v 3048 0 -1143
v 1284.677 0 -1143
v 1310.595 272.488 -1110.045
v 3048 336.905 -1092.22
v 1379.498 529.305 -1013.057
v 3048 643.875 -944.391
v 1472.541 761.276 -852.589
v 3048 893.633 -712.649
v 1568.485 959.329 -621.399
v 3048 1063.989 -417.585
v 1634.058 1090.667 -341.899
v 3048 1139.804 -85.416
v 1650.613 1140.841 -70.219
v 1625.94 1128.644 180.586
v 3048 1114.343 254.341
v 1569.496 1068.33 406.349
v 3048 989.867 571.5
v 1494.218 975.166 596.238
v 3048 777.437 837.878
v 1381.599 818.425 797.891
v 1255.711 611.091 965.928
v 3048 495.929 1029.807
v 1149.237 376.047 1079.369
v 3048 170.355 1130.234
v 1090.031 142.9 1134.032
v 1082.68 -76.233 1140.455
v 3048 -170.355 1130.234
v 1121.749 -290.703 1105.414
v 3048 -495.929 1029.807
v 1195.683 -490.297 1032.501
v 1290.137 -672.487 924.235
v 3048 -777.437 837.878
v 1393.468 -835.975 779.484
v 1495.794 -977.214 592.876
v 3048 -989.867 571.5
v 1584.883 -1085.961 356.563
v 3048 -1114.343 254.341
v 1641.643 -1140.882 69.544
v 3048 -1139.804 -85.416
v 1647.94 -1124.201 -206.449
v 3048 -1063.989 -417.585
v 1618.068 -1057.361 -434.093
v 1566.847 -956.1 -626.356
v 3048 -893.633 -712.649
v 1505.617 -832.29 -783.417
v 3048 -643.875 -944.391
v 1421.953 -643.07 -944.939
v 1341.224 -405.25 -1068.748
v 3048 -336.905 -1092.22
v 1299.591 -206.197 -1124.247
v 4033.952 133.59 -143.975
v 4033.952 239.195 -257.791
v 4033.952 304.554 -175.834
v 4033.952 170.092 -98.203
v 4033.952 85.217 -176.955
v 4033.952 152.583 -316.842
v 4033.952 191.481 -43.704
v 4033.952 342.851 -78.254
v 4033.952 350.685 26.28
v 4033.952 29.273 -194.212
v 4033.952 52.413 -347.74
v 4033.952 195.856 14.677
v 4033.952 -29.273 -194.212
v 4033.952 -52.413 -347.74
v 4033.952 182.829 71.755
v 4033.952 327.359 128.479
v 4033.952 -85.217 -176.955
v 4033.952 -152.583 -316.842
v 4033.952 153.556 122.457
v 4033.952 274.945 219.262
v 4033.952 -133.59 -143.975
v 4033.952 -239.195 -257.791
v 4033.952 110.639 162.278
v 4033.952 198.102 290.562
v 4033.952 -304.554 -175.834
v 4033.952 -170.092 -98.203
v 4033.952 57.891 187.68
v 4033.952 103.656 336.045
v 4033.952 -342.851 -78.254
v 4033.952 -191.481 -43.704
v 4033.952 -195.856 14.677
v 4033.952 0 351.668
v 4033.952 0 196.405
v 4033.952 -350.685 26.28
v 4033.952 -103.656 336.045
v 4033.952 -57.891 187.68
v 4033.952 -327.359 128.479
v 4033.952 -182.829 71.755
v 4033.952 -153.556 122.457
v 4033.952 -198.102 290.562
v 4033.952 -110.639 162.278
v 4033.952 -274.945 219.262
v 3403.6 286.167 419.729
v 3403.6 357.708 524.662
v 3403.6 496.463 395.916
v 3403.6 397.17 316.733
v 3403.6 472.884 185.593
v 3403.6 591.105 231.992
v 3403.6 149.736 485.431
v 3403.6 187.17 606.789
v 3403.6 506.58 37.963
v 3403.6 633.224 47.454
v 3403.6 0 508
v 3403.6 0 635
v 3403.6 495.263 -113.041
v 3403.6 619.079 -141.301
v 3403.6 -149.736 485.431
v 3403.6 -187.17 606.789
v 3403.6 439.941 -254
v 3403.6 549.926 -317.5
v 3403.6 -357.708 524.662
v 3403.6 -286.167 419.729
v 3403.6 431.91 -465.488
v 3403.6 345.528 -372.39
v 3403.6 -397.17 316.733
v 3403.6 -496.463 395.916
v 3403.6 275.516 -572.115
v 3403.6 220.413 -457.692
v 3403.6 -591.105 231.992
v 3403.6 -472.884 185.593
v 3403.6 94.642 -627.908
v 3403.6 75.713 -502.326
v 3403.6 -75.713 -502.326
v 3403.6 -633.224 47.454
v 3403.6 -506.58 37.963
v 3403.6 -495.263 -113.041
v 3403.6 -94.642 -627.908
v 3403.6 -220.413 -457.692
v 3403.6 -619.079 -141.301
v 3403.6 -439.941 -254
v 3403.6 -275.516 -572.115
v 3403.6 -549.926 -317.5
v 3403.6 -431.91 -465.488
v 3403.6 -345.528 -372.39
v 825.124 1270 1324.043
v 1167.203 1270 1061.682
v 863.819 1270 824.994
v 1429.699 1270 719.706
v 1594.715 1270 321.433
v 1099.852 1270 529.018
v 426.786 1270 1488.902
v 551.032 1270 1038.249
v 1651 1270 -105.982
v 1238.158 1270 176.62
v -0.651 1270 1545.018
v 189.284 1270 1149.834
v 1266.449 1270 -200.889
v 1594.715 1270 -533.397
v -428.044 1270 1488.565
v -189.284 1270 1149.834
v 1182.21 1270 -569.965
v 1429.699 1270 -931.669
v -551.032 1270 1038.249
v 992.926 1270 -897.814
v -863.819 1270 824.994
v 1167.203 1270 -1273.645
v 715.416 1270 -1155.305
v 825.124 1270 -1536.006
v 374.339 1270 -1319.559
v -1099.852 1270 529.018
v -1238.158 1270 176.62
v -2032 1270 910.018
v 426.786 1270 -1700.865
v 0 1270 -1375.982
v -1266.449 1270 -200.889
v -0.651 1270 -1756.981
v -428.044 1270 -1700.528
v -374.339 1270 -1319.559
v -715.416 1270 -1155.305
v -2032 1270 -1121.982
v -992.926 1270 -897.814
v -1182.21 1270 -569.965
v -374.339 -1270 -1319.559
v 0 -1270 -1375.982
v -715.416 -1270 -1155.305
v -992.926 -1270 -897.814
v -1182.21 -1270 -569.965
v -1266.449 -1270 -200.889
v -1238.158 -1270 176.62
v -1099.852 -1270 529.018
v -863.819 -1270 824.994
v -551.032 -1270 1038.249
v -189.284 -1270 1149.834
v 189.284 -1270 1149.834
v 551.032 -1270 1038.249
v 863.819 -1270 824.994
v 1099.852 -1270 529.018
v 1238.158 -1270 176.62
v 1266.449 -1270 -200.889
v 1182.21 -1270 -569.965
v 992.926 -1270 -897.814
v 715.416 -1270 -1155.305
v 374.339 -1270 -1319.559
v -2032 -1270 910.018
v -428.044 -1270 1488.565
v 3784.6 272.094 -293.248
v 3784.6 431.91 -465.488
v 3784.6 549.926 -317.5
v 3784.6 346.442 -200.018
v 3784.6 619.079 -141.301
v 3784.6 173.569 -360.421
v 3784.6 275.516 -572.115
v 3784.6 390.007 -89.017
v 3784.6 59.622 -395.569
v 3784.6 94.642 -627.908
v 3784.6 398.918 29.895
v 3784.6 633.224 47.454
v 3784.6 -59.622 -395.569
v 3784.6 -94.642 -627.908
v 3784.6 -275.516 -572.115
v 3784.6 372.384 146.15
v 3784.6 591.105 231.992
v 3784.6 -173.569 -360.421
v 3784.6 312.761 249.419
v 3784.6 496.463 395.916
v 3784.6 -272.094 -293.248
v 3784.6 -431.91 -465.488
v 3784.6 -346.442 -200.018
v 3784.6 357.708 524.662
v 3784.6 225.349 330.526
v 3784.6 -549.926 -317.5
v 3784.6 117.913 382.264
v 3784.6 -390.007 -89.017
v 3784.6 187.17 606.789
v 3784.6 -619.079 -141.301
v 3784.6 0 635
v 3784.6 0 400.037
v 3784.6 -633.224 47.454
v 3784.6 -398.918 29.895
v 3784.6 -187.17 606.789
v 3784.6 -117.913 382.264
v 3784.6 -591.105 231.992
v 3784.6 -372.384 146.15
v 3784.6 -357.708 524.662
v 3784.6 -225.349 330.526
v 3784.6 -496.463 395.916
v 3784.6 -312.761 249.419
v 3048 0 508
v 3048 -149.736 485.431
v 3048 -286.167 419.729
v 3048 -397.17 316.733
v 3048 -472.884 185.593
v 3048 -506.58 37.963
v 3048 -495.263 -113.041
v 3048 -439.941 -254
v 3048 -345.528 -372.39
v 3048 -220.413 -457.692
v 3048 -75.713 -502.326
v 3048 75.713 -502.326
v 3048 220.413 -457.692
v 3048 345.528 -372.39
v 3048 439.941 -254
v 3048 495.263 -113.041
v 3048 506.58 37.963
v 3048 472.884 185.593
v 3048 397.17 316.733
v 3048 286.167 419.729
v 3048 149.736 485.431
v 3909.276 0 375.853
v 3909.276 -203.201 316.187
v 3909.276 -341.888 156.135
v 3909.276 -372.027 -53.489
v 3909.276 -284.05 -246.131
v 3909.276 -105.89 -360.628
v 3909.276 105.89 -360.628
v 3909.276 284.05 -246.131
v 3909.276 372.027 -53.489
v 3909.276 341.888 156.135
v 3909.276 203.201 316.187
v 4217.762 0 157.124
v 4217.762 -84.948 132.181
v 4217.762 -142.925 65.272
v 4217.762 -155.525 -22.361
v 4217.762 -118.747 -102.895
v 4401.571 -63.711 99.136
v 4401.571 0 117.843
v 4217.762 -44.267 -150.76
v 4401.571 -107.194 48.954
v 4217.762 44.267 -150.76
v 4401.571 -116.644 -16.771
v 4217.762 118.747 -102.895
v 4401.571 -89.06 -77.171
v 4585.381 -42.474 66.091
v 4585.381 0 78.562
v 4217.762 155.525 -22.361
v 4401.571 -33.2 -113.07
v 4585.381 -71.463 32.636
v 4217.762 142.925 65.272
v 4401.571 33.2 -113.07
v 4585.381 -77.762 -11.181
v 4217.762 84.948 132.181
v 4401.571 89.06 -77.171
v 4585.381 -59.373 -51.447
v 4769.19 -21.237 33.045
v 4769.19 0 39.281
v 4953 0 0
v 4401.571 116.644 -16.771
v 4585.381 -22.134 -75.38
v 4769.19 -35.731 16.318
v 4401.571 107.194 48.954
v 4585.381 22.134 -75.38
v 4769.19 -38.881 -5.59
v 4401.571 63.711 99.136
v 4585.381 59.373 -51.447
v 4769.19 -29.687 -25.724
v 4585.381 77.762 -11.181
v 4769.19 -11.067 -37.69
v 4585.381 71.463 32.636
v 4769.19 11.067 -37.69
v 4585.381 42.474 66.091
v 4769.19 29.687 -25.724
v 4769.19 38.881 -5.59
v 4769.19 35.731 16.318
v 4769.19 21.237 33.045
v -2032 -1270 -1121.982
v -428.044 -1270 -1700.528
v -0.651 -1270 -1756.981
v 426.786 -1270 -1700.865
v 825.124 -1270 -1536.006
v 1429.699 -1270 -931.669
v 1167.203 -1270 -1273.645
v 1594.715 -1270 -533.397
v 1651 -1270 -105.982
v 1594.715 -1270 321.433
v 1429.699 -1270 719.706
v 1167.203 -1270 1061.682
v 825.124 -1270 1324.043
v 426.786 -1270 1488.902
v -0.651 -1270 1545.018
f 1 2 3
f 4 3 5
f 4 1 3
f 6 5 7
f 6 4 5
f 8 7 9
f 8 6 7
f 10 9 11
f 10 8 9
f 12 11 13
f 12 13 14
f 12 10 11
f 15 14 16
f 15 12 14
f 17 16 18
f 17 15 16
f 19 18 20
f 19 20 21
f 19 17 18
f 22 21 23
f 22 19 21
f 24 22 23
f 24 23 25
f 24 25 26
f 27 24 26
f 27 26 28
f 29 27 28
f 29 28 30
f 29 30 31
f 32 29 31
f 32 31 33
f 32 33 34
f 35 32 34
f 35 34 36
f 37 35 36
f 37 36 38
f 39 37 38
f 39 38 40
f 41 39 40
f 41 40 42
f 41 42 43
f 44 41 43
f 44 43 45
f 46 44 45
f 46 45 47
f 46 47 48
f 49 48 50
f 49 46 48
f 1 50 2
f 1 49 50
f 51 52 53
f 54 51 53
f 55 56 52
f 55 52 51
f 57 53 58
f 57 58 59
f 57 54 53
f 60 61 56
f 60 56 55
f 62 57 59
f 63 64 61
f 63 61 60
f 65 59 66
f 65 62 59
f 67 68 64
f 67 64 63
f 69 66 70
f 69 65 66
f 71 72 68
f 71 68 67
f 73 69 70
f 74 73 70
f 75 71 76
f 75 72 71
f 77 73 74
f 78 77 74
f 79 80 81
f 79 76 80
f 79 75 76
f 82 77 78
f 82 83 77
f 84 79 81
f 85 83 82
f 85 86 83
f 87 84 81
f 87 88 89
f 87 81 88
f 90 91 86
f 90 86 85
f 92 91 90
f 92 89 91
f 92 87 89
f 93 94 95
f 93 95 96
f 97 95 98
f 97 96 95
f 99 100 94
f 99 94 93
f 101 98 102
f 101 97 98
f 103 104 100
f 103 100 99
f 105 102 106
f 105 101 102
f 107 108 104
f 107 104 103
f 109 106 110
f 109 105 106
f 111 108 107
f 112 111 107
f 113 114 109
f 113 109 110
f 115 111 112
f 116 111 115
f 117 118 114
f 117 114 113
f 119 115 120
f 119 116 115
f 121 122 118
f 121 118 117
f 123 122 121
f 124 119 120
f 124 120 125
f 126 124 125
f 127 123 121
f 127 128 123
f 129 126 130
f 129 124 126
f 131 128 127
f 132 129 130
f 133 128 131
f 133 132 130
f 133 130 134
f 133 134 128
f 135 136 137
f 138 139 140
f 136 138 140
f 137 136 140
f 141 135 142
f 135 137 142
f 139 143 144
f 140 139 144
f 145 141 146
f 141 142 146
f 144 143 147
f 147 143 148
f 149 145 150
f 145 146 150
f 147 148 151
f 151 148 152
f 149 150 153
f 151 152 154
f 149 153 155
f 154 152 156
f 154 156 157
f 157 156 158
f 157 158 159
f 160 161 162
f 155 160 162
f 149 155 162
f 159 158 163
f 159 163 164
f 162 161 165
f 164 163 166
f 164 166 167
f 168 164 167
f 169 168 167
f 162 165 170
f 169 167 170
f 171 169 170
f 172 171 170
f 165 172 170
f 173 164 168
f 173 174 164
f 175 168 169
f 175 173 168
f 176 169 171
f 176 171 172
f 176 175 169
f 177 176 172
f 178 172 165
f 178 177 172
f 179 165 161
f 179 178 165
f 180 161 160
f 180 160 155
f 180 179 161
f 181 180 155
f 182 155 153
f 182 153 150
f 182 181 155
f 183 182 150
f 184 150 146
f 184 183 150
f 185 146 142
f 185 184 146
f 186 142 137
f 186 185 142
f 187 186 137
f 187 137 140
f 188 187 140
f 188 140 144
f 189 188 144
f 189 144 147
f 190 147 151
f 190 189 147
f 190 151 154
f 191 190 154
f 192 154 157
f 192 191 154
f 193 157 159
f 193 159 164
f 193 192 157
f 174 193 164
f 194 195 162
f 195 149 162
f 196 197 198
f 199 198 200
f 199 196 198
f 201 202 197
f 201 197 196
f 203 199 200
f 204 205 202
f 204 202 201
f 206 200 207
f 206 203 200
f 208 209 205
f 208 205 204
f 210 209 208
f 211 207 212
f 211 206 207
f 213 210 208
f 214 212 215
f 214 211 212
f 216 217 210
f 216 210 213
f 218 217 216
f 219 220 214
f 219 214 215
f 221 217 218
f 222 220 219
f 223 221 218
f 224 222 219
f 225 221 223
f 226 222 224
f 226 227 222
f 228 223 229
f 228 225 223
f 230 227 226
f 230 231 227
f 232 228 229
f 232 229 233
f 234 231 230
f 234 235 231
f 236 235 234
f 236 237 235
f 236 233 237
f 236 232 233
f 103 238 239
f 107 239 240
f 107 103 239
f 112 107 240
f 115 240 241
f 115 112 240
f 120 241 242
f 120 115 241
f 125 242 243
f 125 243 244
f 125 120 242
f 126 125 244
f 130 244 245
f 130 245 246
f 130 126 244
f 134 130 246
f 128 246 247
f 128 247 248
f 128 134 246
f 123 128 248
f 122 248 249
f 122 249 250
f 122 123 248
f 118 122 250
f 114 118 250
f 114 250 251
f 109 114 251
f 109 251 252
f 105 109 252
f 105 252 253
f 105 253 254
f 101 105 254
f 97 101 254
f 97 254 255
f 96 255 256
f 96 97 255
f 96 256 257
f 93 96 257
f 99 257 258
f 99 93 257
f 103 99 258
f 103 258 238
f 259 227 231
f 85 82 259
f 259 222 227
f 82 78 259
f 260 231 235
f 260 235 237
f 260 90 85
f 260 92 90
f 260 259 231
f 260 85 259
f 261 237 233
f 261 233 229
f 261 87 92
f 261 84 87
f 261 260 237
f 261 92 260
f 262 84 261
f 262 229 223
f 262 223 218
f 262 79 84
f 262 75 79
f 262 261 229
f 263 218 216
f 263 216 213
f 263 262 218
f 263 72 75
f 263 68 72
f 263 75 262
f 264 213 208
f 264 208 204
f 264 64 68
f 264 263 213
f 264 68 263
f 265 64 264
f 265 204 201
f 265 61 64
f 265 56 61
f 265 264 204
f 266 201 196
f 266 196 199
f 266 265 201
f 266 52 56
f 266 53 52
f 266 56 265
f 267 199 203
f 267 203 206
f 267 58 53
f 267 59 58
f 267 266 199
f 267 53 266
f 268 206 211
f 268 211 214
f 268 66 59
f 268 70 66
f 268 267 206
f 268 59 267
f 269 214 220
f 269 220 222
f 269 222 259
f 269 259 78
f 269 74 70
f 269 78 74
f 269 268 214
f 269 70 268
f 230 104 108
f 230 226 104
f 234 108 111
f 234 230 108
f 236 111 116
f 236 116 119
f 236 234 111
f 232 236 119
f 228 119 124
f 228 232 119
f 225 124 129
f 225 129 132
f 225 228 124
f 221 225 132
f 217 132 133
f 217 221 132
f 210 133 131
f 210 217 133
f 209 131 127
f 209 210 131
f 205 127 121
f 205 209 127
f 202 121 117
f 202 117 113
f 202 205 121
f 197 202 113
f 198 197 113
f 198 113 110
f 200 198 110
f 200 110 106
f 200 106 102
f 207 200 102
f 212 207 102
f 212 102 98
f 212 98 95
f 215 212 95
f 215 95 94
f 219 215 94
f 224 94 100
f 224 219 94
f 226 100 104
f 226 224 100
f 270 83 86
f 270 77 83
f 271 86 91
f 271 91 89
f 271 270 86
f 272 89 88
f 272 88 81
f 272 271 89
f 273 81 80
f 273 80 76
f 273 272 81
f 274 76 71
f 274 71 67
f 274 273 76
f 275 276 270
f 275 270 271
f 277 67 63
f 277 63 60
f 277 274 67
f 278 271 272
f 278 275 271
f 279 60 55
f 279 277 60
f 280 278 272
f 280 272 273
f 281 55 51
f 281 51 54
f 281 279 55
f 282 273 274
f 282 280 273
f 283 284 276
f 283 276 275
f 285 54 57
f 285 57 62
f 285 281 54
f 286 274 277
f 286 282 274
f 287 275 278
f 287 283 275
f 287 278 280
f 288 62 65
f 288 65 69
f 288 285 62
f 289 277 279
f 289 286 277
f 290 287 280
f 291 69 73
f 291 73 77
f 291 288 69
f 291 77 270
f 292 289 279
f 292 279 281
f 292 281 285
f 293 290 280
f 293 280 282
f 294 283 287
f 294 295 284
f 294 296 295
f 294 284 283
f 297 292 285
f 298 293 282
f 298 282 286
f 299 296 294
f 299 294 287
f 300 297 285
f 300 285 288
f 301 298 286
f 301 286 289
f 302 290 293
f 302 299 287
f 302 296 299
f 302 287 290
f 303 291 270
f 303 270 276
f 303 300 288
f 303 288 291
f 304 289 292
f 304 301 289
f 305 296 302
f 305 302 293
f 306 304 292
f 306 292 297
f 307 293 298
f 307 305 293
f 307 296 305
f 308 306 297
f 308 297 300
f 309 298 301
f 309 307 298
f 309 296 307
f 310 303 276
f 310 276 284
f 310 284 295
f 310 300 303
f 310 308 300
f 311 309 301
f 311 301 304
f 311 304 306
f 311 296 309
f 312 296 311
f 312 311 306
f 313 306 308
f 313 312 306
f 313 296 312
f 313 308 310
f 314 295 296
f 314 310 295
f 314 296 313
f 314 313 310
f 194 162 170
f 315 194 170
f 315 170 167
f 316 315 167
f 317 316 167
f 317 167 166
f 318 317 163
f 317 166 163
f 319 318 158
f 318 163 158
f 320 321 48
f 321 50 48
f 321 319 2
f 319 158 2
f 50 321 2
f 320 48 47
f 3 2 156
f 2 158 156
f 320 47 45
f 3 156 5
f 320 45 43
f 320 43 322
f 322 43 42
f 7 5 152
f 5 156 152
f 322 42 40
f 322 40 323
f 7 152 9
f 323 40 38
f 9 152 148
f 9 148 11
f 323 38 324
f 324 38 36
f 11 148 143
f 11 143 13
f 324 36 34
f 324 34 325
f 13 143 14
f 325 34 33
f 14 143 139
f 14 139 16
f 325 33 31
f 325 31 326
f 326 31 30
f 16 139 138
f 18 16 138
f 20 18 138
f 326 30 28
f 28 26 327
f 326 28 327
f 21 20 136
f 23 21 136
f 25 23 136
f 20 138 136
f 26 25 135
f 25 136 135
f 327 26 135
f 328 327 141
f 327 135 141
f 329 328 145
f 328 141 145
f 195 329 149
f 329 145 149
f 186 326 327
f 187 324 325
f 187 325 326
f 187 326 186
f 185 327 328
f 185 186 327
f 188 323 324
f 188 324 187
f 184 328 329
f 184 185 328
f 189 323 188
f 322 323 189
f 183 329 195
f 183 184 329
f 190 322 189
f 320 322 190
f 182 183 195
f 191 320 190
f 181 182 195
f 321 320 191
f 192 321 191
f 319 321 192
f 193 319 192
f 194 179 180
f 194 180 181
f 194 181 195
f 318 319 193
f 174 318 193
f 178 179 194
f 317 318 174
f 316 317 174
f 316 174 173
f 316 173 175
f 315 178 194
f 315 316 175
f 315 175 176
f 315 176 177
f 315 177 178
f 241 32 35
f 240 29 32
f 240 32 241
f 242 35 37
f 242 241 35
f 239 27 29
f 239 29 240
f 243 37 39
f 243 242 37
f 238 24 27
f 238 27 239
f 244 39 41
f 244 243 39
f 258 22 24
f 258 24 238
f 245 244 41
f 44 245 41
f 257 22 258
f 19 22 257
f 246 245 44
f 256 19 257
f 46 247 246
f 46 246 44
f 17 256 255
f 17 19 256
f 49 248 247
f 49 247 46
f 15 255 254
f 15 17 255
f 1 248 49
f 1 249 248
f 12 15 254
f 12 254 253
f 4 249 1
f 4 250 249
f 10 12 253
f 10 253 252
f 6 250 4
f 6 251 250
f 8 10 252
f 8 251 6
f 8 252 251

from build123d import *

# Parameters (mm, degrees)
SKETCH1_R                = 1270
BOSS_EXTRUDE1_DEPTH      = 1270
BOSS_EXTRUDE4_REACH      = 5525.249
BOSS_EXTRUDE4_END_RADIUS = 1651
SKETCH4_R                = 1143


with BuildPart() as part:
    # Sketch1 → Boss-Extrude1 (new, symmetric)
    with BuildSketch(Plane(origin=(0, 0, 0), x_dir=(1, 0, 0), z_dir=(0, 1, 0))):
        with BuildLine():
            Line((-2032, 1121.981561932), (-428.04363425, 1700.528408901))
            ThreePointArc((-428.04363425, 1700.528408901), (1651, 105.981561932), (-428.04363425, -1488.565285037))
            Line((-428.04363425, -1488.565285037), (-2032, -910.018438068))
            Line((-2032, -910.018438068), (-2032, 1121.981561932))
        make_face()
        with Locations(Location((0, 105.981561932, 0), (0, 0, 90))):
            Circle(SKETCH1_R, mode=Mode.SUBTRACT)
    extrude(amount=BOSS_EXTRUDE1_DEPTH, both=True)

    # Boss-Extrude4: up to this cylinder (the profile starts outside it)
    boss_extrude4_end = Plane(origin=(0, 0, -105.981561932), z_dir=(0, -1, 0)) * Cylinder(BOSS_EXTRUDE4_END_RADIUS, 14353.498, mode=Mode.PRIVATE)
    # Sketch4 → Boss-Extrude4 (add, up to the surface)
    with BuildSketch(Plane(origin=(3048, 0, 0), x_dir=(0, 0, -1), z_dir=(1, 0, 0)), mode=Mode.PRIVATE) as boss_extrude4_sk1:
        Circle(SKETCH4_R)
    boss_extrude4_tool1 = extrude(boss_extrude4_sk1.sketch, amount=-BOSS_EXTRUDE4_REACH, mode=Mode.PRIVATE) - boss_extrude4_end
    add(boss_extrude4_tool1.solids().sort_by_distance((3048, 0, 0))[0])

    # Sketch8 → Revolve3 (revolve)
    with BuildSketch(Plane(origin=(0, 0, 0), x_dir=(1, 0, 0), z_dir=(0, 1, 0))):
        Polygon((3048, 0), (3048, -508), (3403.6, -508), (3403.6, -635), (3784.6, -635), (3784.6, -400.036853536), (4033.952135237, -351.668344643), (4033.952135237, -196.405351951), (4953, 0), align=None)
    revolve(axis=Axis((0, 0, 0), (1, 0, 0)))


solid = part.part
